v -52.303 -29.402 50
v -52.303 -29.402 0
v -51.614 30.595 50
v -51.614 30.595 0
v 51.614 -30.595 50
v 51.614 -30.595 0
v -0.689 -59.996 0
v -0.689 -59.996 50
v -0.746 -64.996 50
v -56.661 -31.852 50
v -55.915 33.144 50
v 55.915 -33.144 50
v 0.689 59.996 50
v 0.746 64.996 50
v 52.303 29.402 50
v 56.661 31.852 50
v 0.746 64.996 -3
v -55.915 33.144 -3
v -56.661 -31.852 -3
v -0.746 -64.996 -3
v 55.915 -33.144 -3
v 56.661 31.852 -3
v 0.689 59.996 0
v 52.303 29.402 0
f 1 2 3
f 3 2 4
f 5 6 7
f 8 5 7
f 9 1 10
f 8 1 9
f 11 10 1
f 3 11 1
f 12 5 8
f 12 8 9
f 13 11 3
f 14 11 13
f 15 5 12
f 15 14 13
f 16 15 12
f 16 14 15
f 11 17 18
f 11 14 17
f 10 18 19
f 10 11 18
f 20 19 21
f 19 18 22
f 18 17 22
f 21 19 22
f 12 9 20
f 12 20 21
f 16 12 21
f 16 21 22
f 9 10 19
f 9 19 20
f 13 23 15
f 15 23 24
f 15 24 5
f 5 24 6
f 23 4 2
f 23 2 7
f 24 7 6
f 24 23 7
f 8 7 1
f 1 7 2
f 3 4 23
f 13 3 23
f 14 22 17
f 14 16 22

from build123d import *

# Parameters (mm, degrees)
F1_DEPTH = 50
F2_DEPTH = 3


with BuildPart() as f1:
    # F0 (on Top) → F1 (new body)
    with BuildSketch(Plane.XY):
        Polygon((-55.9148403892, 33.1440888282), (-56.6610431051, -31.8516278114), (-0.746202716, -64.9957166397), (55.9148403892, -33.1440888282), (56.6610431051, 31.8516278114), (0.746202716, 64.9957166397), align=None)
        Polygon((51.6136988208, -30.5945435338), (-0.688802507, -59.9960461289), (-52.3025013278, -29.4015025952), (-51.6136988208, 30.5945435338), (0.688802507, 59.9960461289), (52.3025013278, 29.4015025952), align=None, mode=Mode.SUBTRACT)
    extrude(amount=F1_DEPTH)

    # F0 (on Top) → F2 (join)
    with BuildSketch(Plane.XY):
        Polygon((-55.9148403892, 33.1440888282), (-56.6610431051, -31.8516278114), (-0.746202716, -64.9957166397), (55.9148403892, -33.1440888282), (56.6610431051, 31.8516278114), (0.746202716, 64.9957166397), align=None)
        Polygon((51.6136988208, -30.5945435338), (-0.688802507, -59.9960461289), (-52.3025013278, -29.4015025952), (-51.6136988208, 30.5945435338), (0.688802507, 59.9960461289), (52.3025013278, 29.4015025952), align=None, mode=Mode.SUBTRACT)
        Polygon((-52.3025013278, -29.4015025952), (-0.688802507, -59.9960461289), (51.6136988208, -30.5945435338), (52.3025013278, 29.4015025952), (0.688802507, 59.9960461289), (-51.6136988208, 30.5945435338), align=None)
    extrude(amount=-F2_DEPTH)


solid = f1.part
